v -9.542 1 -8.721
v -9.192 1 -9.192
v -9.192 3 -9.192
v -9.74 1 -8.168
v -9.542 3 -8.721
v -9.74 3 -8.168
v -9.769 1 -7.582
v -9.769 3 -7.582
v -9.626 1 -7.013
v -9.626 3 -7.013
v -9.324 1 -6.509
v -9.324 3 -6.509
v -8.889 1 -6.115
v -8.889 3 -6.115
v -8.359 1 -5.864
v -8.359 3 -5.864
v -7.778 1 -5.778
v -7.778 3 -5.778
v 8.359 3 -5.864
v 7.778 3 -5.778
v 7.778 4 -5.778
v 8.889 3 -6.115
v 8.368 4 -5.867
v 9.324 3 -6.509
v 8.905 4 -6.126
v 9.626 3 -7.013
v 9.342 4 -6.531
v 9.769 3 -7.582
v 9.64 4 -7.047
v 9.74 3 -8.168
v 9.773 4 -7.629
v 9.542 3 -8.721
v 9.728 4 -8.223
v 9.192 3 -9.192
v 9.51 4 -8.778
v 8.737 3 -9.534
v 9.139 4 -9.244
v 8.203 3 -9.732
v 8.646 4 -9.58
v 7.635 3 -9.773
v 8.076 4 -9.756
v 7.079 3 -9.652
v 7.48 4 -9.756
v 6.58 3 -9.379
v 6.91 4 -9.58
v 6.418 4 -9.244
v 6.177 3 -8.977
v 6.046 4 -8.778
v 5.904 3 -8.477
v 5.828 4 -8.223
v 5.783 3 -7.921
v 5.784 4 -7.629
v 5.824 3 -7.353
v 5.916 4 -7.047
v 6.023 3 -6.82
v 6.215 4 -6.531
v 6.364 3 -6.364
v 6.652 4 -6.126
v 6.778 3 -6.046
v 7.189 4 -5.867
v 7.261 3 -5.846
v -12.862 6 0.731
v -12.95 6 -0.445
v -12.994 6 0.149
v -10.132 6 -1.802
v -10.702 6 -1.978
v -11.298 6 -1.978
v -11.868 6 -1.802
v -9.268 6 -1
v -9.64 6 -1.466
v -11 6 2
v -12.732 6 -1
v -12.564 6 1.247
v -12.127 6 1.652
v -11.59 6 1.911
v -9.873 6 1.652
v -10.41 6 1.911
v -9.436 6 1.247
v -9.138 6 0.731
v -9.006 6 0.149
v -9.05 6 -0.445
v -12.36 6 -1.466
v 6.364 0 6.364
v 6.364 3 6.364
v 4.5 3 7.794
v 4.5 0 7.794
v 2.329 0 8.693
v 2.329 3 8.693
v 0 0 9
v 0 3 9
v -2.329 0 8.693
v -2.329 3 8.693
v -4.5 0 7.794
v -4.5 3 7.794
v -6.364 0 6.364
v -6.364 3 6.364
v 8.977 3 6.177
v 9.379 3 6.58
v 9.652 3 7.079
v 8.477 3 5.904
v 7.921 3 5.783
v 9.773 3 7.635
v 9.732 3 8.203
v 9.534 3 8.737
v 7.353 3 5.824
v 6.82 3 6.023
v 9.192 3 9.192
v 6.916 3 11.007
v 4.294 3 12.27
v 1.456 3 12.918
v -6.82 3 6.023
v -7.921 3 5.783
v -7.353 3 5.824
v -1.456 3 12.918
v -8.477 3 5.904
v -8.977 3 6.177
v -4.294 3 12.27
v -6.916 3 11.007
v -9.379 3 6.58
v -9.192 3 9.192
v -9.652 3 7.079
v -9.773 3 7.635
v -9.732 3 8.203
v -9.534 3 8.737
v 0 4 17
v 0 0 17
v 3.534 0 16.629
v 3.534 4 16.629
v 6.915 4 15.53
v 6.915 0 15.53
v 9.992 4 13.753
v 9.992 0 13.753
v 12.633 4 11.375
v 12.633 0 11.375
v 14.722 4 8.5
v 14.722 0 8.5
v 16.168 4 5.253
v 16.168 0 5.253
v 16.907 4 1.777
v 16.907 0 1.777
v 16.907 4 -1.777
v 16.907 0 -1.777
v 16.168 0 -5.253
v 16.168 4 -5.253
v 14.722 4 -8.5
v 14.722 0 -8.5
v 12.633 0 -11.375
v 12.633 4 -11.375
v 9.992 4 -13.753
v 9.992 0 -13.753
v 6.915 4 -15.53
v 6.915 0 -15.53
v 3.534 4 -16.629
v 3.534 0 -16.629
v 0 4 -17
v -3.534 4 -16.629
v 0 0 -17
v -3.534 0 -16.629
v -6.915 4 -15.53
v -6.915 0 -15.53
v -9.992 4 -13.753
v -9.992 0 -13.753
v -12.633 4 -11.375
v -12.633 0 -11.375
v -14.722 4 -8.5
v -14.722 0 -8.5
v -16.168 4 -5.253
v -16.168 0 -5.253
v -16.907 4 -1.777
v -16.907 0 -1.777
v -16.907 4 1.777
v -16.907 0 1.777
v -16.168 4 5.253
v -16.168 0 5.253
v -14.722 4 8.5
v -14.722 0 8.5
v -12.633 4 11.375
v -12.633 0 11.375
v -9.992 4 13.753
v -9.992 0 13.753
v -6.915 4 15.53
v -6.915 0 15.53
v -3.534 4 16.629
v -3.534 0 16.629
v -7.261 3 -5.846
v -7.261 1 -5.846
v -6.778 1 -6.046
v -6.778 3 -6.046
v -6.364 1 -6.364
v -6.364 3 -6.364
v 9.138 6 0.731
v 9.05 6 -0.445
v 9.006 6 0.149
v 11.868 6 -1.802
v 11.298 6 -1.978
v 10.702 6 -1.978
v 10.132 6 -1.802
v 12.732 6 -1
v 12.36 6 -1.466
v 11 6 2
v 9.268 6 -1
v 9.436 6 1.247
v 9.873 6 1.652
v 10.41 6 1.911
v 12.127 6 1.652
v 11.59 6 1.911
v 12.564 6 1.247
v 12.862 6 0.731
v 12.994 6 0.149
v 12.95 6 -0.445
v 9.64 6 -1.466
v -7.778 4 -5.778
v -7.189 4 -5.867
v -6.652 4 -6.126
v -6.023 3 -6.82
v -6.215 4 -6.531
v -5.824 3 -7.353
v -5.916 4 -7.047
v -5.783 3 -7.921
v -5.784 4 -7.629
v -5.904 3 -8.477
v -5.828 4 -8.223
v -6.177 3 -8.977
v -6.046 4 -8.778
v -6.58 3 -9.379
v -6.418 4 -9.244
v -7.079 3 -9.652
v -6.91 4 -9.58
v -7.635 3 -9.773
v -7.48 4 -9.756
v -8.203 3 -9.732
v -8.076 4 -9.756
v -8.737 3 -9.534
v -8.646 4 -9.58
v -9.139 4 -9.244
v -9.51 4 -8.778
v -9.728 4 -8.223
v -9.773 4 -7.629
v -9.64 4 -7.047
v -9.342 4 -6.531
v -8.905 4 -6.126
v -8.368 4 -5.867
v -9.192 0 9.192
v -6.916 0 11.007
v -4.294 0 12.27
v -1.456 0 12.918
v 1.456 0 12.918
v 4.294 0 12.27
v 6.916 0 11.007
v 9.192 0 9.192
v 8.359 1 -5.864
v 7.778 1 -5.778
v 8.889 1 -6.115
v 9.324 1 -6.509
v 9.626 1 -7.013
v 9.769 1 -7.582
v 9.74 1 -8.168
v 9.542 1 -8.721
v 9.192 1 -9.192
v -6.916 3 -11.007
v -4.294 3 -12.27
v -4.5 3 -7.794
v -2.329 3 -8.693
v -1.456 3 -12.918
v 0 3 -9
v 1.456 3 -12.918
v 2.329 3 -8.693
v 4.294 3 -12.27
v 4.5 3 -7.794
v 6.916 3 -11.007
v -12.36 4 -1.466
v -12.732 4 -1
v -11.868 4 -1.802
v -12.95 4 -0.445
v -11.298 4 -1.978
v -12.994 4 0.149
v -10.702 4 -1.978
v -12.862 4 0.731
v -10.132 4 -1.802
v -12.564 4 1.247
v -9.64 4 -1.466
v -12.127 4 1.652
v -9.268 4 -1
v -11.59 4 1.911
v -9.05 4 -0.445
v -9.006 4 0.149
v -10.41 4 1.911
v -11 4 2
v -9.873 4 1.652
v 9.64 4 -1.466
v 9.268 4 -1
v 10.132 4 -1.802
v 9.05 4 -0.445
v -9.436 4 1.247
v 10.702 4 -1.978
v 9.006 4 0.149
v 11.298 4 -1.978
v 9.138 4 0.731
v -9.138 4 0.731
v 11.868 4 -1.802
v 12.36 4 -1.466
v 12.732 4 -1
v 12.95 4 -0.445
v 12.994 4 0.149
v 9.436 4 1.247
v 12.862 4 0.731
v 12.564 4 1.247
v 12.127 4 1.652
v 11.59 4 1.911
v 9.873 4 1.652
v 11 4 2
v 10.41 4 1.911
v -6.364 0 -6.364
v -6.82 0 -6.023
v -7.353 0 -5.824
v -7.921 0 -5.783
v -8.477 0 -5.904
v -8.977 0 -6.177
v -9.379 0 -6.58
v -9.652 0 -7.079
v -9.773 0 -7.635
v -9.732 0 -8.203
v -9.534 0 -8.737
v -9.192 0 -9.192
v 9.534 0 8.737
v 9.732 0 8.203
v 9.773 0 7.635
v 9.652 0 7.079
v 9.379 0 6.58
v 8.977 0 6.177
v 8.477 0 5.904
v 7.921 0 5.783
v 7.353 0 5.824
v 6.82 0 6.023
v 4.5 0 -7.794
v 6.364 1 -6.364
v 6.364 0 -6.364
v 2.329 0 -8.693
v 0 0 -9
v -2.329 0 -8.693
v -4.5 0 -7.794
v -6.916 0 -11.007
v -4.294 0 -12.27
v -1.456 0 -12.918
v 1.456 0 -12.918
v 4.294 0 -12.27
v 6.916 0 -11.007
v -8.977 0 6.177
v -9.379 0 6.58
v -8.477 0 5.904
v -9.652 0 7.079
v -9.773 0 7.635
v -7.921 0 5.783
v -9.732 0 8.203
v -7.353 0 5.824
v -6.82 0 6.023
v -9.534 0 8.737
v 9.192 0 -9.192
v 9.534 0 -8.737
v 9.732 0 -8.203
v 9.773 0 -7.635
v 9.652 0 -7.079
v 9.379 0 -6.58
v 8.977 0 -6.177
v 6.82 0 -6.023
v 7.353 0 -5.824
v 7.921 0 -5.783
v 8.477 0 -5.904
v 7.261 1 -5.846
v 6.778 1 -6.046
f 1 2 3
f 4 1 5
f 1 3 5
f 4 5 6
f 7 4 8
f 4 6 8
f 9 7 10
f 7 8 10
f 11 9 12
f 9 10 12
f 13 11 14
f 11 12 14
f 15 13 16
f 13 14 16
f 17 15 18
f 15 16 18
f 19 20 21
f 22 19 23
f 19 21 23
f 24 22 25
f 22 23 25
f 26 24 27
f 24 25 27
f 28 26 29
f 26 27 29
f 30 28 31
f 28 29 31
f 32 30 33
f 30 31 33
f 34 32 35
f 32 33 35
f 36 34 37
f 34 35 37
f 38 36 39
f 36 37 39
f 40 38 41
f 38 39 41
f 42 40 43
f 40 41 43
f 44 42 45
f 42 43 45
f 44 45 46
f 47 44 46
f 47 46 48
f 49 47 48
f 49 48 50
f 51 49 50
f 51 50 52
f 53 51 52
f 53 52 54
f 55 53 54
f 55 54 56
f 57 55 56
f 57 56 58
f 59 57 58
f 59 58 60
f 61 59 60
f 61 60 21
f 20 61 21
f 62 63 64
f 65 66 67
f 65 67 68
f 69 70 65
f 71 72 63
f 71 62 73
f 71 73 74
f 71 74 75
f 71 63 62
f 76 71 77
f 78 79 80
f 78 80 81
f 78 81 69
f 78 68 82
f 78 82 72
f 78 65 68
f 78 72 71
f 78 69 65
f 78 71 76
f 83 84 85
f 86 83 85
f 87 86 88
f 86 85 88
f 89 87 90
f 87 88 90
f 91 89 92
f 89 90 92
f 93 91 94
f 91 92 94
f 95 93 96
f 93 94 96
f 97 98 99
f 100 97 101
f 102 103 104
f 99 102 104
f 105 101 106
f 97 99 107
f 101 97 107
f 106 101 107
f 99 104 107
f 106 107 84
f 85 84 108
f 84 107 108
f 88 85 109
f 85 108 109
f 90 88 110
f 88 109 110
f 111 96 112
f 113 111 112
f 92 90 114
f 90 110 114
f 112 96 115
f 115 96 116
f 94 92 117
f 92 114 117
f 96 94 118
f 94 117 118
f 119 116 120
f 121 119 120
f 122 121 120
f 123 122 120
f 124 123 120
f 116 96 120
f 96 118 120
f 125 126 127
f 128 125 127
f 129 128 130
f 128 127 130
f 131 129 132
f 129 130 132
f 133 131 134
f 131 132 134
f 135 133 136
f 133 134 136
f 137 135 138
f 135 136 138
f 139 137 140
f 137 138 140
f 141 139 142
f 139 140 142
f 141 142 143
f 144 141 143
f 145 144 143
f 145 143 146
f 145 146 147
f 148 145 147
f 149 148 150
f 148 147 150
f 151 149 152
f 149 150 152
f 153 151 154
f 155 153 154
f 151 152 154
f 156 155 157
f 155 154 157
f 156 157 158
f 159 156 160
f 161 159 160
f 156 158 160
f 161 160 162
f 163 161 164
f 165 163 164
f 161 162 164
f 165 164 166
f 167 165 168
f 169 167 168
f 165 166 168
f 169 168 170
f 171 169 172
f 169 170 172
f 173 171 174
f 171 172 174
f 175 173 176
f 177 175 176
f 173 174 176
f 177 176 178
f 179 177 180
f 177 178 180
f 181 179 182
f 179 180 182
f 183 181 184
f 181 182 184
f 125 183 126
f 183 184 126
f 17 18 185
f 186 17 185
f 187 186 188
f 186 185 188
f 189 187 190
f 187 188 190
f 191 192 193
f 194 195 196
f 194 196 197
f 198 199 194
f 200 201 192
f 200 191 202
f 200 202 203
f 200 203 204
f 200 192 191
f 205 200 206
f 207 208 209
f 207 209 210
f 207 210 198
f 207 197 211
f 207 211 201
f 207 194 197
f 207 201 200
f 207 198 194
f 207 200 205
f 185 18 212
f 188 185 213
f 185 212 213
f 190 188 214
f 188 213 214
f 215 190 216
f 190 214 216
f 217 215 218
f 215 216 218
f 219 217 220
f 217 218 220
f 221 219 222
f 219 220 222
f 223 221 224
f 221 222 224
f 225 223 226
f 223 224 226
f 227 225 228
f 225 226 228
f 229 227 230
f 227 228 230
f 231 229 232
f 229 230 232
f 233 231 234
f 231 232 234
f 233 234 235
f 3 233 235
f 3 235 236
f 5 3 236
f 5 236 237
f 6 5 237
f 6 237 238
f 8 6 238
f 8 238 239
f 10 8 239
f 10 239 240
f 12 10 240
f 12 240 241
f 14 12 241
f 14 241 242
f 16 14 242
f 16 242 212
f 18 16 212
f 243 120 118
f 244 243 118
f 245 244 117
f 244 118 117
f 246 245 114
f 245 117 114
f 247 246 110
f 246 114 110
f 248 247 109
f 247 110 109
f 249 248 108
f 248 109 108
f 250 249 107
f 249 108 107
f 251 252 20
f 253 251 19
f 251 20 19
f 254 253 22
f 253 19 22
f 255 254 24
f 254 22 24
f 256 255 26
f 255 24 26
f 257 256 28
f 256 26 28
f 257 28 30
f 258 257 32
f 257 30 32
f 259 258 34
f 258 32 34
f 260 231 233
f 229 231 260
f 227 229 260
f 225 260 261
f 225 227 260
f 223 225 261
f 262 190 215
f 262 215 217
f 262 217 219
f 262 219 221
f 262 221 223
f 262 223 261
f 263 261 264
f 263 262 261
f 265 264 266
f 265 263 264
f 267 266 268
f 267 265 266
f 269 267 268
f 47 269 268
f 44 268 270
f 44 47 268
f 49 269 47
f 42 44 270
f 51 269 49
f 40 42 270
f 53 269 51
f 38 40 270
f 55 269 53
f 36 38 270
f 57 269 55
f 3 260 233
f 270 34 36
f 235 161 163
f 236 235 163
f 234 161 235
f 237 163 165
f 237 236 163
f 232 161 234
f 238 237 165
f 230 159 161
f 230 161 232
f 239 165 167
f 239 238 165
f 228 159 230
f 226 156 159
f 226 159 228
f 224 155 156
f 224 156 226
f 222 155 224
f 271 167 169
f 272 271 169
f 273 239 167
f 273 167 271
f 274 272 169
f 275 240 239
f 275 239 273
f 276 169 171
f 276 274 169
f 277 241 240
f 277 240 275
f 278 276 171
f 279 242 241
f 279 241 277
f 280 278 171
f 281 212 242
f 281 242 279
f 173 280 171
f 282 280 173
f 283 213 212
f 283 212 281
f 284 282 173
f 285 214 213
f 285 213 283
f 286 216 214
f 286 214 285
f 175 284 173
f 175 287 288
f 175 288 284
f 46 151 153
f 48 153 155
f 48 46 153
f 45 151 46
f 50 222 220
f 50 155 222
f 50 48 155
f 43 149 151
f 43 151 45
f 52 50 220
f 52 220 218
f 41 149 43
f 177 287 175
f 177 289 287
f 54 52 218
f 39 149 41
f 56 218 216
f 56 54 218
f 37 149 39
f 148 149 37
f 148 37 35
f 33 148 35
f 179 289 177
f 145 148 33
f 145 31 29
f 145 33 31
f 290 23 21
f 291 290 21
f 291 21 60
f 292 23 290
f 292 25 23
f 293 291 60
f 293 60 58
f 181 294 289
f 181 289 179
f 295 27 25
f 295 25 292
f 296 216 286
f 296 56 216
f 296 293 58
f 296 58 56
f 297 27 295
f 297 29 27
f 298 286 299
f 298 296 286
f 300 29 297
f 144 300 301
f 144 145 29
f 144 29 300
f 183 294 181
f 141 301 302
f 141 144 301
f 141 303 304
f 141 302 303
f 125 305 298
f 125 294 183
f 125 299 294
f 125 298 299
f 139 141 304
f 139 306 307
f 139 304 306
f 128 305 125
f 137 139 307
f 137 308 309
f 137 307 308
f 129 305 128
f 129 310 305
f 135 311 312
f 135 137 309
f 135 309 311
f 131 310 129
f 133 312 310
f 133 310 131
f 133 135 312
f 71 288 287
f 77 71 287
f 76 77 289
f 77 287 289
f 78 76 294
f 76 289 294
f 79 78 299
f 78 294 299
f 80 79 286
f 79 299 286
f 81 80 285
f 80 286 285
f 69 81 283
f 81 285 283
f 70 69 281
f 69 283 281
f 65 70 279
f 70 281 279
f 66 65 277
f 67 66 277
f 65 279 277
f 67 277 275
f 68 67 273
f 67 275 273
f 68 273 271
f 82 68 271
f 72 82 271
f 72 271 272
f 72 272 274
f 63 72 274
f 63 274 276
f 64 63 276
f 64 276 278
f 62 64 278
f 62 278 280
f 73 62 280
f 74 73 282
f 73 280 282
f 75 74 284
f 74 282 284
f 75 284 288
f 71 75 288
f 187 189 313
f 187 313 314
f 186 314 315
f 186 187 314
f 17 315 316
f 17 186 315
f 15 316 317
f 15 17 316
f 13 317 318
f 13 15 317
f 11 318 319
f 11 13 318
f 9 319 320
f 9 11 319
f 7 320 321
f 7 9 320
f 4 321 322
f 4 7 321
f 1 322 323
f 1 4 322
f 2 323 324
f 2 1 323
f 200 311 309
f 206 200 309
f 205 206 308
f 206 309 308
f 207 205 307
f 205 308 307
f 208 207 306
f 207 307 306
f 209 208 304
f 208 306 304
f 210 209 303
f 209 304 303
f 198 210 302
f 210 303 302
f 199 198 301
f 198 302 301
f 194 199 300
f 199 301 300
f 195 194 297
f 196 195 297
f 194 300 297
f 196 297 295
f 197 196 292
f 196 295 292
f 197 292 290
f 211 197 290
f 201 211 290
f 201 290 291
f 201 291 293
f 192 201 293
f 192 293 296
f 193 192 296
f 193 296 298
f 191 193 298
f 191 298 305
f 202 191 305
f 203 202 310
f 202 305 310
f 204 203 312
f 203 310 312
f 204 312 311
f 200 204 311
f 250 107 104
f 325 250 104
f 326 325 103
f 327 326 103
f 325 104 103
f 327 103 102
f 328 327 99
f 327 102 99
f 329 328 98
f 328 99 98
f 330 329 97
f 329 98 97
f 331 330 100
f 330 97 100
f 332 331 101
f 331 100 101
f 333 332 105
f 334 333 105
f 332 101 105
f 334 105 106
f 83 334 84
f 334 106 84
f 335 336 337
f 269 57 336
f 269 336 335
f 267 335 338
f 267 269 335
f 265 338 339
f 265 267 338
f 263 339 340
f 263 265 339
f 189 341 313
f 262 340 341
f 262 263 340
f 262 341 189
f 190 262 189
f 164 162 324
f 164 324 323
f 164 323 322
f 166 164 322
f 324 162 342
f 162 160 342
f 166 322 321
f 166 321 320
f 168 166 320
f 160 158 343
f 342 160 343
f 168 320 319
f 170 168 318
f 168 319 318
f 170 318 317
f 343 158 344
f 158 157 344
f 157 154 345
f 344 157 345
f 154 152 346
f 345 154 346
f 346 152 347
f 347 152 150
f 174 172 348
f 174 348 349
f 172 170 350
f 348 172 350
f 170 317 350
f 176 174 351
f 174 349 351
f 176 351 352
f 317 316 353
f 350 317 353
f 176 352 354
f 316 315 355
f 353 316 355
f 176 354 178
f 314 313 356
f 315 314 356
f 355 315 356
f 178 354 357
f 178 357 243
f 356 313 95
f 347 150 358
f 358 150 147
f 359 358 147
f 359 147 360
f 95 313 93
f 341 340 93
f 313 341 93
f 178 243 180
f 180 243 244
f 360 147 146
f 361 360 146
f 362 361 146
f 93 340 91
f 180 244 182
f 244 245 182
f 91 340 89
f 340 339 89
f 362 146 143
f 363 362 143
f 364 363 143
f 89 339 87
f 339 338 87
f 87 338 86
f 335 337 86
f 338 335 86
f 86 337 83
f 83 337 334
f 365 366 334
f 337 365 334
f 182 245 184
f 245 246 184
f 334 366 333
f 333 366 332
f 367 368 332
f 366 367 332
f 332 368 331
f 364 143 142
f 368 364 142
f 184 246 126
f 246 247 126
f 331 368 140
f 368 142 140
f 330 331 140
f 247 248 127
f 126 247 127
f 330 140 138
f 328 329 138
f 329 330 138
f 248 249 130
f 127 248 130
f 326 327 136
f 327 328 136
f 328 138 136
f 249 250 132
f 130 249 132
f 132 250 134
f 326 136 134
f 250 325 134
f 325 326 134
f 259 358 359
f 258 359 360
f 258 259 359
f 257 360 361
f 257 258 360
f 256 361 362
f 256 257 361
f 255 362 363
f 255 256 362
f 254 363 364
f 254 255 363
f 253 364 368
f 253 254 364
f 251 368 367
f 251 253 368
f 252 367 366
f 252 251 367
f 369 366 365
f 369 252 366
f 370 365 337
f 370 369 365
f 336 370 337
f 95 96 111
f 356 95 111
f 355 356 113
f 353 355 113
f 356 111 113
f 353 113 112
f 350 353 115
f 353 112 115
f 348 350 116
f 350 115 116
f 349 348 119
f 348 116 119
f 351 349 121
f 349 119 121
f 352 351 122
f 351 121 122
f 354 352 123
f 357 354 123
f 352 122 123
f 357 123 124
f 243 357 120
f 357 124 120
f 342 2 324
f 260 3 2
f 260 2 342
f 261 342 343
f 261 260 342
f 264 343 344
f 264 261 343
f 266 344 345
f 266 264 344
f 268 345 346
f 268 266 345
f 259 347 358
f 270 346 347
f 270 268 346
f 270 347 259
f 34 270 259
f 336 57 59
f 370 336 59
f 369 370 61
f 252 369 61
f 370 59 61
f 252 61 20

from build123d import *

# Parameters (mm, degrees)
SKETCH_1_R          = 17
EXTRUDE_1_DEPTH     = 4
SKETCH_2_R          = 2
CUT_EXTRUDE_1_DEPTH = 3
SKETCH_2_3_R        = 2
EXTRUDE_2_DEPTH     = 2
CUT_EXTRUDE_START   = -3
CUT_EXTRUDE_2_DEPTH = 3


with BuildPart() as part:
    # 草图1 → 凸台-拉伸1 (new body)
    with BuildSketch(Plane(origin=(0, 0, 0), x_dir=(1, 0, 0), z_dir=(0, 1, 0))):
        Circle(SKETCH_1_R)
    extrude(amount=EXTRUDE_1_DEPTH)

    # 草图2 → 切除-拉伸1 (cut)
    with BuildSketch(Plane(origin=(0, 4, 0), x_dir=(1, 0, 0), z_dir=(0, 1, 0))):
        with Locations((-7.778174593, 7.778174593)):
            Circle(SKETCH_2_R)
        with Locations((7.778174593, 7.778174593)):
            Circle(SKETCH_2_R)
    extrude(amount=-CUT_EXTRUDE_1_DEPTH, mode=Mode.SUBTRACT)

    # 草图2<3> → 凸台-拉伸2 (add)
    with BuildSketch(Plane(origin=(0, 4, 0), x_dir=(1, 0, 0), z_dir=(0, 1, 0))):
        with Locations((-11, 0)):
            Circle(SKETCH_2_3_R)
        with Locations((11, 0)):
            Circle(SKETCH_2_3_R)
    extrude(amount=EXTRUDE_2_DEPTH)

    # 草图4 → 切除-拉伸2 (cut)
    with BuildSketch(Plane.XZ.offset(CUT_EXTRUDE_START)):
        with BuildLine():
            ThreePointArc((-9.192388155, -9.192388155), (0, -13), (9.192388155, -9.192388155))
            ThreePointArc((9.192388155, -9.192388155), (9.192388155, -6.363961031), (6.363961031, -6.363961031))
            ThreePointArc((6.363961031, -6.363961031), (0, -9), (-6.363961031, -6.363961031))
            ThreePointArc((-6.363961031, -6.363961031), (-9.192388155, -6.363961031), (-9.192388155, -9.192388155))
        make_face()
        with BuildLine():
            ThreePointArc((-9.192388155, 9.192388155), (0, 13), (9.192388155, 9.192388155))
            ThreePointArc((9.192388155, 9.192388155), (9.192388155, 6.363961031), (6.363961031, 6.363961031))
            ThreePointArc((6.363961031, 6.363961031), (0, 9), (-6.363961031, 6.363961031))
            ThreePointArc((-6.363961031, 6.363961031), (-9.192388155, 6.363961031), (-9.192388155, 9.192388155))
        make_face()
    extrude(amount=CUT_EXTRUDE_2_DEPTH, mode=Mode.SUBTRACT)


solid = part.part
